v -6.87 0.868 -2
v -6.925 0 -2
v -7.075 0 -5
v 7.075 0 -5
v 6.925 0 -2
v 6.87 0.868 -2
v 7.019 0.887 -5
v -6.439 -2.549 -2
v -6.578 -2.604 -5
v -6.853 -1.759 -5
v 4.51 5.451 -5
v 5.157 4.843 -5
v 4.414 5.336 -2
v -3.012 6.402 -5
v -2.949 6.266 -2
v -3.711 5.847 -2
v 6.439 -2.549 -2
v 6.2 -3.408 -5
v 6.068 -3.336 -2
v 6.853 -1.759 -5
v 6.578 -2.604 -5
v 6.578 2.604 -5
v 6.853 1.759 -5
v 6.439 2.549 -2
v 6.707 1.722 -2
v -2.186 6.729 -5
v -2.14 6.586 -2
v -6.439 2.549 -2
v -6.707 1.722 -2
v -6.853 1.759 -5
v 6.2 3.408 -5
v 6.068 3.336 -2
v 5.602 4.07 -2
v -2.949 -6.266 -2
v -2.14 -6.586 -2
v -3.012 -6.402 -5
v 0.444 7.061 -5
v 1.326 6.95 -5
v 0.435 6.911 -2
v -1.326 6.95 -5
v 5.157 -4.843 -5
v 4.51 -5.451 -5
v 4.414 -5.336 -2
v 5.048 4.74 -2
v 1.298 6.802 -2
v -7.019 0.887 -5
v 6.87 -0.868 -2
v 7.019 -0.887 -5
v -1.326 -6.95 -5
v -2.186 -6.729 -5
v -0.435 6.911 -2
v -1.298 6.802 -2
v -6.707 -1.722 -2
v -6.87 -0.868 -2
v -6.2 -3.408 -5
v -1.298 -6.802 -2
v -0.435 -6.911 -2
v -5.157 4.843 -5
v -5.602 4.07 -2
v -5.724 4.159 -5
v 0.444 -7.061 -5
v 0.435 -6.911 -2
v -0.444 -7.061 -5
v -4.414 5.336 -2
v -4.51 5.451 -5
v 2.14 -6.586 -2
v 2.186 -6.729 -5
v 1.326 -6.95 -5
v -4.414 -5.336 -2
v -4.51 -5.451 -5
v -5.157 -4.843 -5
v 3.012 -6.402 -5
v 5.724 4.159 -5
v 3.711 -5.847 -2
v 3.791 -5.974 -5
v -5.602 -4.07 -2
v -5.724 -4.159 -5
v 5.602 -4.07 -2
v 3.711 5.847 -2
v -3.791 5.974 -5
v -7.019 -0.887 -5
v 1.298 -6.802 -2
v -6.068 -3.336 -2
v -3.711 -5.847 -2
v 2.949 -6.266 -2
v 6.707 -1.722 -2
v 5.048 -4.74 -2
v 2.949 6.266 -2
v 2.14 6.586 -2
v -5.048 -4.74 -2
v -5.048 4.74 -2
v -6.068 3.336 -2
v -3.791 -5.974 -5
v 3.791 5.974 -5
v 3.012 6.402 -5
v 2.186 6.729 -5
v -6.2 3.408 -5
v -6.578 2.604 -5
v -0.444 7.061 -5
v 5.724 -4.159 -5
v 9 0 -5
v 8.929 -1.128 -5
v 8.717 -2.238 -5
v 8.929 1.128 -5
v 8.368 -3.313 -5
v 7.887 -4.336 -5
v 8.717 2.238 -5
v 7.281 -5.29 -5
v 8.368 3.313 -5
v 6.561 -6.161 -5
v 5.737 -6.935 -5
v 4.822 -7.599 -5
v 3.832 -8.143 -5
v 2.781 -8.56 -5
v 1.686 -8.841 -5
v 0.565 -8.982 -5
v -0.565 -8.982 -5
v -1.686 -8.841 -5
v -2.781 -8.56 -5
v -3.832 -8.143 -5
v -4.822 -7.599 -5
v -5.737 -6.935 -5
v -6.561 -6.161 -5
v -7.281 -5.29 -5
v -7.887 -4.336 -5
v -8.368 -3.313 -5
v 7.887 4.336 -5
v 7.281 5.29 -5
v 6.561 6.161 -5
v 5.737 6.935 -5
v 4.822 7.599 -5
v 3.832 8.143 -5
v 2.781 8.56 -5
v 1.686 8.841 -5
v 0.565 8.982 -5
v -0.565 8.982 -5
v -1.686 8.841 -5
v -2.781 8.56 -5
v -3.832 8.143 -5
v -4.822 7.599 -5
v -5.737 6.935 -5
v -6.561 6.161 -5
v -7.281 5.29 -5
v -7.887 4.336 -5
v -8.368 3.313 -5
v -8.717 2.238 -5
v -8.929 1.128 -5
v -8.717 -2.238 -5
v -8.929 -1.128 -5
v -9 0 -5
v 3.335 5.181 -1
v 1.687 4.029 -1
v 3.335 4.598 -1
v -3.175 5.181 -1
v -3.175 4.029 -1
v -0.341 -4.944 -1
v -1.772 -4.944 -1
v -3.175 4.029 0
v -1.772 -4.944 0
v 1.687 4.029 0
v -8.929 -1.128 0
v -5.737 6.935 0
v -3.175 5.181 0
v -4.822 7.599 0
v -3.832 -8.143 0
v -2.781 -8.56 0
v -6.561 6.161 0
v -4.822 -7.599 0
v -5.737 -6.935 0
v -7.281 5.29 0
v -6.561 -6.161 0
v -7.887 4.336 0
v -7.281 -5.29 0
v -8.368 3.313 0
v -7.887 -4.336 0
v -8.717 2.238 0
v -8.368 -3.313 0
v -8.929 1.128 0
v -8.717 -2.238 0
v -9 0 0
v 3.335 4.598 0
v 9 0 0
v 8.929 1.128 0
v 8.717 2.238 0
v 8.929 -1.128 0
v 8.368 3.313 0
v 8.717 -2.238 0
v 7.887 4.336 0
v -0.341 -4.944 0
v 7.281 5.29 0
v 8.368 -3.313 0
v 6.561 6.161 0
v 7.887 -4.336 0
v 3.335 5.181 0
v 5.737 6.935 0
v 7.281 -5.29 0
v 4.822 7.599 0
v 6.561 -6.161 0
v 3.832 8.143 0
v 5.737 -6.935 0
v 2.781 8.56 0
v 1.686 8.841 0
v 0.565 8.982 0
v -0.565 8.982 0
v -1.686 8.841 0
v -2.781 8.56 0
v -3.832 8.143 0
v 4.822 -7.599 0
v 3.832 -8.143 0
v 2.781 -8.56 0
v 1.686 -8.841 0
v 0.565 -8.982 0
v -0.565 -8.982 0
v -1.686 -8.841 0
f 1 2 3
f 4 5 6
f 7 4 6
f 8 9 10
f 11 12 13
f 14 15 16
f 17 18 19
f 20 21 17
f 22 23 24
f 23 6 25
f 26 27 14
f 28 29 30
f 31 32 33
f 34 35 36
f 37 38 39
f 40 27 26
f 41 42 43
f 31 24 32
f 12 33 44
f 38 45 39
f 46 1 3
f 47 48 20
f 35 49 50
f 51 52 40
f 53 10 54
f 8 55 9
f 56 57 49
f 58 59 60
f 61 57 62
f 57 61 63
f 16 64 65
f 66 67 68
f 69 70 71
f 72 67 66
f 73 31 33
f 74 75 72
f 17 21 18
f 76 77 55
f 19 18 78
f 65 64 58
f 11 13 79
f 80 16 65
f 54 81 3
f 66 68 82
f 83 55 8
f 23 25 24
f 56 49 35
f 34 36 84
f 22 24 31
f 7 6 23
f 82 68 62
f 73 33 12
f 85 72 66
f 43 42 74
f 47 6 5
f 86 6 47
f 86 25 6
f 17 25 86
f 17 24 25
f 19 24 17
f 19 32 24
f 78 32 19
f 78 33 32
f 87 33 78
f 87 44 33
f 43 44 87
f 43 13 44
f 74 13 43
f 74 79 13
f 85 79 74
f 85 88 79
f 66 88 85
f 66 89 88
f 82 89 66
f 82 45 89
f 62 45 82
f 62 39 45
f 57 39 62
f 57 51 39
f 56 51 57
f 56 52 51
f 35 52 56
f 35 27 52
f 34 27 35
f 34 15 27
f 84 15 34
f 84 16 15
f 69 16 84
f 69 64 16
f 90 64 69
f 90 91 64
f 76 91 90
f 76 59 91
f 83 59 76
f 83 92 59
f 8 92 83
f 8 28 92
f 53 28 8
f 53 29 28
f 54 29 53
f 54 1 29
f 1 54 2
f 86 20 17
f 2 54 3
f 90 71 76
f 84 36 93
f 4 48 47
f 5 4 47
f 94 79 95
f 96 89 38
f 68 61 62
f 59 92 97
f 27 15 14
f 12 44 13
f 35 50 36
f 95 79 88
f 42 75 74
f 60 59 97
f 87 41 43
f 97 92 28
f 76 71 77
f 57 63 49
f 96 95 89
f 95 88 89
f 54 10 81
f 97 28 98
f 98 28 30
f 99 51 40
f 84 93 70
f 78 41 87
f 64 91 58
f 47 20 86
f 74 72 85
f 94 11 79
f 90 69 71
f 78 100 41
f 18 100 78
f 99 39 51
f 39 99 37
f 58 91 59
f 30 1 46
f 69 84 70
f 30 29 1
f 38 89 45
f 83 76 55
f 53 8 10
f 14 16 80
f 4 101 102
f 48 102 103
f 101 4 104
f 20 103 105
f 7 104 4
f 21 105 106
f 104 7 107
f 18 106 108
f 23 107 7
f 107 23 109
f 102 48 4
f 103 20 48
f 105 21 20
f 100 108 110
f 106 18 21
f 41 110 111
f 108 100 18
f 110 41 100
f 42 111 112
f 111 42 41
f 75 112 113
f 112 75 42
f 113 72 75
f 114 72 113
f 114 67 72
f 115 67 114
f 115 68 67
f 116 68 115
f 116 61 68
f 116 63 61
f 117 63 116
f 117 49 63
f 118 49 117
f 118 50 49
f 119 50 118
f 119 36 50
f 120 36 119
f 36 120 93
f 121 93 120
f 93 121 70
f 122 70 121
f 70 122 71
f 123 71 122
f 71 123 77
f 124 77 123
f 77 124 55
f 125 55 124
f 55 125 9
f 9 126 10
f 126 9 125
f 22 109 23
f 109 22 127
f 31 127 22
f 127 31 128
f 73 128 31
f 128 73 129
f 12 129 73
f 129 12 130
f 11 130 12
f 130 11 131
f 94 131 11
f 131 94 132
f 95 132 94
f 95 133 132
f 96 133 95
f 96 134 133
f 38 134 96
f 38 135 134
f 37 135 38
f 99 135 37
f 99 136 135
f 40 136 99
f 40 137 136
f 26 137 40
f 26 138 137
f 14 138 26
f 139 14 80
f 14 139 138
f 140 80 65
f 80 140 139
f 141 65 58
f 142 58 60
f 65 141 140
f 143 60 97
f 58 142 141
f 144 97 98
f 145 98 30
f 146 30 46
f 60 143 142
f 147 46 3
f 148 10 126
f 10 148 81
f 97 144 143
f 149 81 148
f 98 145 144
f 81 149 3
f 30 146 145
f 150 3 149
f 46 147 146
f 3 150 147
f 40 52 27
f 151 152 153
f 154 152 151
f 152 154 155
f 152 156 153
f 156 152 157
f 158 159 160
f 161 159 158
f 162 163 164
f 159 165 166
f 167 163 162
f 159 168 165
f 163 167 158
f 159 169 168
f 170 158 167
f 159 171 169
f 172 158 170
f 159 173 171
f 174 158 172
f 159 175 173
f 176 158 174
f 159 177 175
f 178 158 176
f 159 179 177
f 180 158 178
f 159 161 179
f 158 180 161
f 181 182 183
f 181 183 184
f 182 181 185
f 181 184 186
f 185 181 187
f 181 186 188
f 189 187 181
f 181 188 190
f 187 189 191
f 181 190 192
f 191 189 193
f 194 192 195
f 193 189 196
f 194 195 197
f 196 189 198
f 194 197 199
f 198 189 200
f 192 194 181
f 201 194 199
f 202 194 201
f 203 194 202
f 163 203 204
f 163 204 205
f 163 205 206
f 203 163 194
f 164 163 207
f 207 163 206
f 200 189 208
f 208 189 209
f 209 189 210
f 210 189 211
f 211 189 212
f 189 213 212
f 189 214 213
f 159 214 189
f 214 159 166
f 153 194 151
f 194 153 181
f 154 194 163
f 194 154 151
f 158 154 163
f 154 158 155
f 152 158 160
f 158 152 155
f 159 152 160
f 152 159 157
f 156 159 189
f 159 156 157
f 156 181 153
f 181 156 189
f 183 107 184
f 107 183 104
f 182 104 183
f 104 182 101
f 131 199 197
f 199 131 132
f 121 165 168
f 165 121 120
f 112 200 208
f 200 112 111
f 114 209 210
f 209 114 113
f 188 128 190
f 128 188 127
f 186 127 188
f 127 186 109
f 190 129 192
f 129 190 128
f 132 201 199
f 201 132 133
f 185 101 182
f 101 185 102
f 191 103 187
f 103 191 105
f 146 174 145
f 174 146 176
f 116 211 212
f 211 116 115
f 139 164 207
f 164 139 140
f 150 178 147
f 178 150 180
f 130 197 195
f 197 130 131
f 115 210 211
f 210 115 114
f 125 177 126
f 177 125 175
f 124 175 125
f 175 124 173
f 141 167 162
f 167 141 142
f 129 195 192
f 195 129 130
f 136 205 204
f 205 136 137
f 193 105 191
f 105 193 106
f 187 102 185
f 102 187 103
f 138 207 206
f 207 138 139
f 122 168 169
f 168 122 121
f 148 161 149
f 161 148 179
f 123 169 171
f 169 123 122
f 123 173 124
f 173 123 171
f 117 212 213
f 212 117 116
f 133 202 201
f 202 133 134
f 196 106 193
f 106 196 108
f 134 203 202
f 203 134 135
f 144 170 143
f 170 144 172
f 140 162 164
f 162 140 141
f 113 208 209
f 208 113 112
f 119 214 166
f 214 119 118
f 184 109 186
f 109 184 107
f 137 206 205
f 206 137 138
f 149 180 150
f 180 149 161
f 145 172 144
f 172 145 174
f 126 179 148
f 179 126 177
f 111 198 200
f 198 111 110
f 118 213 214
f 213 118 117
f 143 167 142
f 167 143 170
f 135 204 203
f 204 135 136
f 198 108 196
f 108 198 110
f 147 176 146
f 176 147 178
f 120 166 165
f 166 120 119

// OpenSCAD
$fn = 50;

difference() {
	union() {
		translate(v = [0, 0, -5.0]) {
			cylinder(h = 5, r = 9.0);
		}
	}
	union() {
		#translate(v = [0, 0, -5.0]) {
			cylinder(h = 3, r1 = 7.075, r2 = 6.925);
		}
		translate(v = [0, 0, -1]) {
			linear_extrude(height = 1) {
				text(font = "Impact", halign = "center", size = 10, text = "7", valign = "center");
			}
		}
	}
}
